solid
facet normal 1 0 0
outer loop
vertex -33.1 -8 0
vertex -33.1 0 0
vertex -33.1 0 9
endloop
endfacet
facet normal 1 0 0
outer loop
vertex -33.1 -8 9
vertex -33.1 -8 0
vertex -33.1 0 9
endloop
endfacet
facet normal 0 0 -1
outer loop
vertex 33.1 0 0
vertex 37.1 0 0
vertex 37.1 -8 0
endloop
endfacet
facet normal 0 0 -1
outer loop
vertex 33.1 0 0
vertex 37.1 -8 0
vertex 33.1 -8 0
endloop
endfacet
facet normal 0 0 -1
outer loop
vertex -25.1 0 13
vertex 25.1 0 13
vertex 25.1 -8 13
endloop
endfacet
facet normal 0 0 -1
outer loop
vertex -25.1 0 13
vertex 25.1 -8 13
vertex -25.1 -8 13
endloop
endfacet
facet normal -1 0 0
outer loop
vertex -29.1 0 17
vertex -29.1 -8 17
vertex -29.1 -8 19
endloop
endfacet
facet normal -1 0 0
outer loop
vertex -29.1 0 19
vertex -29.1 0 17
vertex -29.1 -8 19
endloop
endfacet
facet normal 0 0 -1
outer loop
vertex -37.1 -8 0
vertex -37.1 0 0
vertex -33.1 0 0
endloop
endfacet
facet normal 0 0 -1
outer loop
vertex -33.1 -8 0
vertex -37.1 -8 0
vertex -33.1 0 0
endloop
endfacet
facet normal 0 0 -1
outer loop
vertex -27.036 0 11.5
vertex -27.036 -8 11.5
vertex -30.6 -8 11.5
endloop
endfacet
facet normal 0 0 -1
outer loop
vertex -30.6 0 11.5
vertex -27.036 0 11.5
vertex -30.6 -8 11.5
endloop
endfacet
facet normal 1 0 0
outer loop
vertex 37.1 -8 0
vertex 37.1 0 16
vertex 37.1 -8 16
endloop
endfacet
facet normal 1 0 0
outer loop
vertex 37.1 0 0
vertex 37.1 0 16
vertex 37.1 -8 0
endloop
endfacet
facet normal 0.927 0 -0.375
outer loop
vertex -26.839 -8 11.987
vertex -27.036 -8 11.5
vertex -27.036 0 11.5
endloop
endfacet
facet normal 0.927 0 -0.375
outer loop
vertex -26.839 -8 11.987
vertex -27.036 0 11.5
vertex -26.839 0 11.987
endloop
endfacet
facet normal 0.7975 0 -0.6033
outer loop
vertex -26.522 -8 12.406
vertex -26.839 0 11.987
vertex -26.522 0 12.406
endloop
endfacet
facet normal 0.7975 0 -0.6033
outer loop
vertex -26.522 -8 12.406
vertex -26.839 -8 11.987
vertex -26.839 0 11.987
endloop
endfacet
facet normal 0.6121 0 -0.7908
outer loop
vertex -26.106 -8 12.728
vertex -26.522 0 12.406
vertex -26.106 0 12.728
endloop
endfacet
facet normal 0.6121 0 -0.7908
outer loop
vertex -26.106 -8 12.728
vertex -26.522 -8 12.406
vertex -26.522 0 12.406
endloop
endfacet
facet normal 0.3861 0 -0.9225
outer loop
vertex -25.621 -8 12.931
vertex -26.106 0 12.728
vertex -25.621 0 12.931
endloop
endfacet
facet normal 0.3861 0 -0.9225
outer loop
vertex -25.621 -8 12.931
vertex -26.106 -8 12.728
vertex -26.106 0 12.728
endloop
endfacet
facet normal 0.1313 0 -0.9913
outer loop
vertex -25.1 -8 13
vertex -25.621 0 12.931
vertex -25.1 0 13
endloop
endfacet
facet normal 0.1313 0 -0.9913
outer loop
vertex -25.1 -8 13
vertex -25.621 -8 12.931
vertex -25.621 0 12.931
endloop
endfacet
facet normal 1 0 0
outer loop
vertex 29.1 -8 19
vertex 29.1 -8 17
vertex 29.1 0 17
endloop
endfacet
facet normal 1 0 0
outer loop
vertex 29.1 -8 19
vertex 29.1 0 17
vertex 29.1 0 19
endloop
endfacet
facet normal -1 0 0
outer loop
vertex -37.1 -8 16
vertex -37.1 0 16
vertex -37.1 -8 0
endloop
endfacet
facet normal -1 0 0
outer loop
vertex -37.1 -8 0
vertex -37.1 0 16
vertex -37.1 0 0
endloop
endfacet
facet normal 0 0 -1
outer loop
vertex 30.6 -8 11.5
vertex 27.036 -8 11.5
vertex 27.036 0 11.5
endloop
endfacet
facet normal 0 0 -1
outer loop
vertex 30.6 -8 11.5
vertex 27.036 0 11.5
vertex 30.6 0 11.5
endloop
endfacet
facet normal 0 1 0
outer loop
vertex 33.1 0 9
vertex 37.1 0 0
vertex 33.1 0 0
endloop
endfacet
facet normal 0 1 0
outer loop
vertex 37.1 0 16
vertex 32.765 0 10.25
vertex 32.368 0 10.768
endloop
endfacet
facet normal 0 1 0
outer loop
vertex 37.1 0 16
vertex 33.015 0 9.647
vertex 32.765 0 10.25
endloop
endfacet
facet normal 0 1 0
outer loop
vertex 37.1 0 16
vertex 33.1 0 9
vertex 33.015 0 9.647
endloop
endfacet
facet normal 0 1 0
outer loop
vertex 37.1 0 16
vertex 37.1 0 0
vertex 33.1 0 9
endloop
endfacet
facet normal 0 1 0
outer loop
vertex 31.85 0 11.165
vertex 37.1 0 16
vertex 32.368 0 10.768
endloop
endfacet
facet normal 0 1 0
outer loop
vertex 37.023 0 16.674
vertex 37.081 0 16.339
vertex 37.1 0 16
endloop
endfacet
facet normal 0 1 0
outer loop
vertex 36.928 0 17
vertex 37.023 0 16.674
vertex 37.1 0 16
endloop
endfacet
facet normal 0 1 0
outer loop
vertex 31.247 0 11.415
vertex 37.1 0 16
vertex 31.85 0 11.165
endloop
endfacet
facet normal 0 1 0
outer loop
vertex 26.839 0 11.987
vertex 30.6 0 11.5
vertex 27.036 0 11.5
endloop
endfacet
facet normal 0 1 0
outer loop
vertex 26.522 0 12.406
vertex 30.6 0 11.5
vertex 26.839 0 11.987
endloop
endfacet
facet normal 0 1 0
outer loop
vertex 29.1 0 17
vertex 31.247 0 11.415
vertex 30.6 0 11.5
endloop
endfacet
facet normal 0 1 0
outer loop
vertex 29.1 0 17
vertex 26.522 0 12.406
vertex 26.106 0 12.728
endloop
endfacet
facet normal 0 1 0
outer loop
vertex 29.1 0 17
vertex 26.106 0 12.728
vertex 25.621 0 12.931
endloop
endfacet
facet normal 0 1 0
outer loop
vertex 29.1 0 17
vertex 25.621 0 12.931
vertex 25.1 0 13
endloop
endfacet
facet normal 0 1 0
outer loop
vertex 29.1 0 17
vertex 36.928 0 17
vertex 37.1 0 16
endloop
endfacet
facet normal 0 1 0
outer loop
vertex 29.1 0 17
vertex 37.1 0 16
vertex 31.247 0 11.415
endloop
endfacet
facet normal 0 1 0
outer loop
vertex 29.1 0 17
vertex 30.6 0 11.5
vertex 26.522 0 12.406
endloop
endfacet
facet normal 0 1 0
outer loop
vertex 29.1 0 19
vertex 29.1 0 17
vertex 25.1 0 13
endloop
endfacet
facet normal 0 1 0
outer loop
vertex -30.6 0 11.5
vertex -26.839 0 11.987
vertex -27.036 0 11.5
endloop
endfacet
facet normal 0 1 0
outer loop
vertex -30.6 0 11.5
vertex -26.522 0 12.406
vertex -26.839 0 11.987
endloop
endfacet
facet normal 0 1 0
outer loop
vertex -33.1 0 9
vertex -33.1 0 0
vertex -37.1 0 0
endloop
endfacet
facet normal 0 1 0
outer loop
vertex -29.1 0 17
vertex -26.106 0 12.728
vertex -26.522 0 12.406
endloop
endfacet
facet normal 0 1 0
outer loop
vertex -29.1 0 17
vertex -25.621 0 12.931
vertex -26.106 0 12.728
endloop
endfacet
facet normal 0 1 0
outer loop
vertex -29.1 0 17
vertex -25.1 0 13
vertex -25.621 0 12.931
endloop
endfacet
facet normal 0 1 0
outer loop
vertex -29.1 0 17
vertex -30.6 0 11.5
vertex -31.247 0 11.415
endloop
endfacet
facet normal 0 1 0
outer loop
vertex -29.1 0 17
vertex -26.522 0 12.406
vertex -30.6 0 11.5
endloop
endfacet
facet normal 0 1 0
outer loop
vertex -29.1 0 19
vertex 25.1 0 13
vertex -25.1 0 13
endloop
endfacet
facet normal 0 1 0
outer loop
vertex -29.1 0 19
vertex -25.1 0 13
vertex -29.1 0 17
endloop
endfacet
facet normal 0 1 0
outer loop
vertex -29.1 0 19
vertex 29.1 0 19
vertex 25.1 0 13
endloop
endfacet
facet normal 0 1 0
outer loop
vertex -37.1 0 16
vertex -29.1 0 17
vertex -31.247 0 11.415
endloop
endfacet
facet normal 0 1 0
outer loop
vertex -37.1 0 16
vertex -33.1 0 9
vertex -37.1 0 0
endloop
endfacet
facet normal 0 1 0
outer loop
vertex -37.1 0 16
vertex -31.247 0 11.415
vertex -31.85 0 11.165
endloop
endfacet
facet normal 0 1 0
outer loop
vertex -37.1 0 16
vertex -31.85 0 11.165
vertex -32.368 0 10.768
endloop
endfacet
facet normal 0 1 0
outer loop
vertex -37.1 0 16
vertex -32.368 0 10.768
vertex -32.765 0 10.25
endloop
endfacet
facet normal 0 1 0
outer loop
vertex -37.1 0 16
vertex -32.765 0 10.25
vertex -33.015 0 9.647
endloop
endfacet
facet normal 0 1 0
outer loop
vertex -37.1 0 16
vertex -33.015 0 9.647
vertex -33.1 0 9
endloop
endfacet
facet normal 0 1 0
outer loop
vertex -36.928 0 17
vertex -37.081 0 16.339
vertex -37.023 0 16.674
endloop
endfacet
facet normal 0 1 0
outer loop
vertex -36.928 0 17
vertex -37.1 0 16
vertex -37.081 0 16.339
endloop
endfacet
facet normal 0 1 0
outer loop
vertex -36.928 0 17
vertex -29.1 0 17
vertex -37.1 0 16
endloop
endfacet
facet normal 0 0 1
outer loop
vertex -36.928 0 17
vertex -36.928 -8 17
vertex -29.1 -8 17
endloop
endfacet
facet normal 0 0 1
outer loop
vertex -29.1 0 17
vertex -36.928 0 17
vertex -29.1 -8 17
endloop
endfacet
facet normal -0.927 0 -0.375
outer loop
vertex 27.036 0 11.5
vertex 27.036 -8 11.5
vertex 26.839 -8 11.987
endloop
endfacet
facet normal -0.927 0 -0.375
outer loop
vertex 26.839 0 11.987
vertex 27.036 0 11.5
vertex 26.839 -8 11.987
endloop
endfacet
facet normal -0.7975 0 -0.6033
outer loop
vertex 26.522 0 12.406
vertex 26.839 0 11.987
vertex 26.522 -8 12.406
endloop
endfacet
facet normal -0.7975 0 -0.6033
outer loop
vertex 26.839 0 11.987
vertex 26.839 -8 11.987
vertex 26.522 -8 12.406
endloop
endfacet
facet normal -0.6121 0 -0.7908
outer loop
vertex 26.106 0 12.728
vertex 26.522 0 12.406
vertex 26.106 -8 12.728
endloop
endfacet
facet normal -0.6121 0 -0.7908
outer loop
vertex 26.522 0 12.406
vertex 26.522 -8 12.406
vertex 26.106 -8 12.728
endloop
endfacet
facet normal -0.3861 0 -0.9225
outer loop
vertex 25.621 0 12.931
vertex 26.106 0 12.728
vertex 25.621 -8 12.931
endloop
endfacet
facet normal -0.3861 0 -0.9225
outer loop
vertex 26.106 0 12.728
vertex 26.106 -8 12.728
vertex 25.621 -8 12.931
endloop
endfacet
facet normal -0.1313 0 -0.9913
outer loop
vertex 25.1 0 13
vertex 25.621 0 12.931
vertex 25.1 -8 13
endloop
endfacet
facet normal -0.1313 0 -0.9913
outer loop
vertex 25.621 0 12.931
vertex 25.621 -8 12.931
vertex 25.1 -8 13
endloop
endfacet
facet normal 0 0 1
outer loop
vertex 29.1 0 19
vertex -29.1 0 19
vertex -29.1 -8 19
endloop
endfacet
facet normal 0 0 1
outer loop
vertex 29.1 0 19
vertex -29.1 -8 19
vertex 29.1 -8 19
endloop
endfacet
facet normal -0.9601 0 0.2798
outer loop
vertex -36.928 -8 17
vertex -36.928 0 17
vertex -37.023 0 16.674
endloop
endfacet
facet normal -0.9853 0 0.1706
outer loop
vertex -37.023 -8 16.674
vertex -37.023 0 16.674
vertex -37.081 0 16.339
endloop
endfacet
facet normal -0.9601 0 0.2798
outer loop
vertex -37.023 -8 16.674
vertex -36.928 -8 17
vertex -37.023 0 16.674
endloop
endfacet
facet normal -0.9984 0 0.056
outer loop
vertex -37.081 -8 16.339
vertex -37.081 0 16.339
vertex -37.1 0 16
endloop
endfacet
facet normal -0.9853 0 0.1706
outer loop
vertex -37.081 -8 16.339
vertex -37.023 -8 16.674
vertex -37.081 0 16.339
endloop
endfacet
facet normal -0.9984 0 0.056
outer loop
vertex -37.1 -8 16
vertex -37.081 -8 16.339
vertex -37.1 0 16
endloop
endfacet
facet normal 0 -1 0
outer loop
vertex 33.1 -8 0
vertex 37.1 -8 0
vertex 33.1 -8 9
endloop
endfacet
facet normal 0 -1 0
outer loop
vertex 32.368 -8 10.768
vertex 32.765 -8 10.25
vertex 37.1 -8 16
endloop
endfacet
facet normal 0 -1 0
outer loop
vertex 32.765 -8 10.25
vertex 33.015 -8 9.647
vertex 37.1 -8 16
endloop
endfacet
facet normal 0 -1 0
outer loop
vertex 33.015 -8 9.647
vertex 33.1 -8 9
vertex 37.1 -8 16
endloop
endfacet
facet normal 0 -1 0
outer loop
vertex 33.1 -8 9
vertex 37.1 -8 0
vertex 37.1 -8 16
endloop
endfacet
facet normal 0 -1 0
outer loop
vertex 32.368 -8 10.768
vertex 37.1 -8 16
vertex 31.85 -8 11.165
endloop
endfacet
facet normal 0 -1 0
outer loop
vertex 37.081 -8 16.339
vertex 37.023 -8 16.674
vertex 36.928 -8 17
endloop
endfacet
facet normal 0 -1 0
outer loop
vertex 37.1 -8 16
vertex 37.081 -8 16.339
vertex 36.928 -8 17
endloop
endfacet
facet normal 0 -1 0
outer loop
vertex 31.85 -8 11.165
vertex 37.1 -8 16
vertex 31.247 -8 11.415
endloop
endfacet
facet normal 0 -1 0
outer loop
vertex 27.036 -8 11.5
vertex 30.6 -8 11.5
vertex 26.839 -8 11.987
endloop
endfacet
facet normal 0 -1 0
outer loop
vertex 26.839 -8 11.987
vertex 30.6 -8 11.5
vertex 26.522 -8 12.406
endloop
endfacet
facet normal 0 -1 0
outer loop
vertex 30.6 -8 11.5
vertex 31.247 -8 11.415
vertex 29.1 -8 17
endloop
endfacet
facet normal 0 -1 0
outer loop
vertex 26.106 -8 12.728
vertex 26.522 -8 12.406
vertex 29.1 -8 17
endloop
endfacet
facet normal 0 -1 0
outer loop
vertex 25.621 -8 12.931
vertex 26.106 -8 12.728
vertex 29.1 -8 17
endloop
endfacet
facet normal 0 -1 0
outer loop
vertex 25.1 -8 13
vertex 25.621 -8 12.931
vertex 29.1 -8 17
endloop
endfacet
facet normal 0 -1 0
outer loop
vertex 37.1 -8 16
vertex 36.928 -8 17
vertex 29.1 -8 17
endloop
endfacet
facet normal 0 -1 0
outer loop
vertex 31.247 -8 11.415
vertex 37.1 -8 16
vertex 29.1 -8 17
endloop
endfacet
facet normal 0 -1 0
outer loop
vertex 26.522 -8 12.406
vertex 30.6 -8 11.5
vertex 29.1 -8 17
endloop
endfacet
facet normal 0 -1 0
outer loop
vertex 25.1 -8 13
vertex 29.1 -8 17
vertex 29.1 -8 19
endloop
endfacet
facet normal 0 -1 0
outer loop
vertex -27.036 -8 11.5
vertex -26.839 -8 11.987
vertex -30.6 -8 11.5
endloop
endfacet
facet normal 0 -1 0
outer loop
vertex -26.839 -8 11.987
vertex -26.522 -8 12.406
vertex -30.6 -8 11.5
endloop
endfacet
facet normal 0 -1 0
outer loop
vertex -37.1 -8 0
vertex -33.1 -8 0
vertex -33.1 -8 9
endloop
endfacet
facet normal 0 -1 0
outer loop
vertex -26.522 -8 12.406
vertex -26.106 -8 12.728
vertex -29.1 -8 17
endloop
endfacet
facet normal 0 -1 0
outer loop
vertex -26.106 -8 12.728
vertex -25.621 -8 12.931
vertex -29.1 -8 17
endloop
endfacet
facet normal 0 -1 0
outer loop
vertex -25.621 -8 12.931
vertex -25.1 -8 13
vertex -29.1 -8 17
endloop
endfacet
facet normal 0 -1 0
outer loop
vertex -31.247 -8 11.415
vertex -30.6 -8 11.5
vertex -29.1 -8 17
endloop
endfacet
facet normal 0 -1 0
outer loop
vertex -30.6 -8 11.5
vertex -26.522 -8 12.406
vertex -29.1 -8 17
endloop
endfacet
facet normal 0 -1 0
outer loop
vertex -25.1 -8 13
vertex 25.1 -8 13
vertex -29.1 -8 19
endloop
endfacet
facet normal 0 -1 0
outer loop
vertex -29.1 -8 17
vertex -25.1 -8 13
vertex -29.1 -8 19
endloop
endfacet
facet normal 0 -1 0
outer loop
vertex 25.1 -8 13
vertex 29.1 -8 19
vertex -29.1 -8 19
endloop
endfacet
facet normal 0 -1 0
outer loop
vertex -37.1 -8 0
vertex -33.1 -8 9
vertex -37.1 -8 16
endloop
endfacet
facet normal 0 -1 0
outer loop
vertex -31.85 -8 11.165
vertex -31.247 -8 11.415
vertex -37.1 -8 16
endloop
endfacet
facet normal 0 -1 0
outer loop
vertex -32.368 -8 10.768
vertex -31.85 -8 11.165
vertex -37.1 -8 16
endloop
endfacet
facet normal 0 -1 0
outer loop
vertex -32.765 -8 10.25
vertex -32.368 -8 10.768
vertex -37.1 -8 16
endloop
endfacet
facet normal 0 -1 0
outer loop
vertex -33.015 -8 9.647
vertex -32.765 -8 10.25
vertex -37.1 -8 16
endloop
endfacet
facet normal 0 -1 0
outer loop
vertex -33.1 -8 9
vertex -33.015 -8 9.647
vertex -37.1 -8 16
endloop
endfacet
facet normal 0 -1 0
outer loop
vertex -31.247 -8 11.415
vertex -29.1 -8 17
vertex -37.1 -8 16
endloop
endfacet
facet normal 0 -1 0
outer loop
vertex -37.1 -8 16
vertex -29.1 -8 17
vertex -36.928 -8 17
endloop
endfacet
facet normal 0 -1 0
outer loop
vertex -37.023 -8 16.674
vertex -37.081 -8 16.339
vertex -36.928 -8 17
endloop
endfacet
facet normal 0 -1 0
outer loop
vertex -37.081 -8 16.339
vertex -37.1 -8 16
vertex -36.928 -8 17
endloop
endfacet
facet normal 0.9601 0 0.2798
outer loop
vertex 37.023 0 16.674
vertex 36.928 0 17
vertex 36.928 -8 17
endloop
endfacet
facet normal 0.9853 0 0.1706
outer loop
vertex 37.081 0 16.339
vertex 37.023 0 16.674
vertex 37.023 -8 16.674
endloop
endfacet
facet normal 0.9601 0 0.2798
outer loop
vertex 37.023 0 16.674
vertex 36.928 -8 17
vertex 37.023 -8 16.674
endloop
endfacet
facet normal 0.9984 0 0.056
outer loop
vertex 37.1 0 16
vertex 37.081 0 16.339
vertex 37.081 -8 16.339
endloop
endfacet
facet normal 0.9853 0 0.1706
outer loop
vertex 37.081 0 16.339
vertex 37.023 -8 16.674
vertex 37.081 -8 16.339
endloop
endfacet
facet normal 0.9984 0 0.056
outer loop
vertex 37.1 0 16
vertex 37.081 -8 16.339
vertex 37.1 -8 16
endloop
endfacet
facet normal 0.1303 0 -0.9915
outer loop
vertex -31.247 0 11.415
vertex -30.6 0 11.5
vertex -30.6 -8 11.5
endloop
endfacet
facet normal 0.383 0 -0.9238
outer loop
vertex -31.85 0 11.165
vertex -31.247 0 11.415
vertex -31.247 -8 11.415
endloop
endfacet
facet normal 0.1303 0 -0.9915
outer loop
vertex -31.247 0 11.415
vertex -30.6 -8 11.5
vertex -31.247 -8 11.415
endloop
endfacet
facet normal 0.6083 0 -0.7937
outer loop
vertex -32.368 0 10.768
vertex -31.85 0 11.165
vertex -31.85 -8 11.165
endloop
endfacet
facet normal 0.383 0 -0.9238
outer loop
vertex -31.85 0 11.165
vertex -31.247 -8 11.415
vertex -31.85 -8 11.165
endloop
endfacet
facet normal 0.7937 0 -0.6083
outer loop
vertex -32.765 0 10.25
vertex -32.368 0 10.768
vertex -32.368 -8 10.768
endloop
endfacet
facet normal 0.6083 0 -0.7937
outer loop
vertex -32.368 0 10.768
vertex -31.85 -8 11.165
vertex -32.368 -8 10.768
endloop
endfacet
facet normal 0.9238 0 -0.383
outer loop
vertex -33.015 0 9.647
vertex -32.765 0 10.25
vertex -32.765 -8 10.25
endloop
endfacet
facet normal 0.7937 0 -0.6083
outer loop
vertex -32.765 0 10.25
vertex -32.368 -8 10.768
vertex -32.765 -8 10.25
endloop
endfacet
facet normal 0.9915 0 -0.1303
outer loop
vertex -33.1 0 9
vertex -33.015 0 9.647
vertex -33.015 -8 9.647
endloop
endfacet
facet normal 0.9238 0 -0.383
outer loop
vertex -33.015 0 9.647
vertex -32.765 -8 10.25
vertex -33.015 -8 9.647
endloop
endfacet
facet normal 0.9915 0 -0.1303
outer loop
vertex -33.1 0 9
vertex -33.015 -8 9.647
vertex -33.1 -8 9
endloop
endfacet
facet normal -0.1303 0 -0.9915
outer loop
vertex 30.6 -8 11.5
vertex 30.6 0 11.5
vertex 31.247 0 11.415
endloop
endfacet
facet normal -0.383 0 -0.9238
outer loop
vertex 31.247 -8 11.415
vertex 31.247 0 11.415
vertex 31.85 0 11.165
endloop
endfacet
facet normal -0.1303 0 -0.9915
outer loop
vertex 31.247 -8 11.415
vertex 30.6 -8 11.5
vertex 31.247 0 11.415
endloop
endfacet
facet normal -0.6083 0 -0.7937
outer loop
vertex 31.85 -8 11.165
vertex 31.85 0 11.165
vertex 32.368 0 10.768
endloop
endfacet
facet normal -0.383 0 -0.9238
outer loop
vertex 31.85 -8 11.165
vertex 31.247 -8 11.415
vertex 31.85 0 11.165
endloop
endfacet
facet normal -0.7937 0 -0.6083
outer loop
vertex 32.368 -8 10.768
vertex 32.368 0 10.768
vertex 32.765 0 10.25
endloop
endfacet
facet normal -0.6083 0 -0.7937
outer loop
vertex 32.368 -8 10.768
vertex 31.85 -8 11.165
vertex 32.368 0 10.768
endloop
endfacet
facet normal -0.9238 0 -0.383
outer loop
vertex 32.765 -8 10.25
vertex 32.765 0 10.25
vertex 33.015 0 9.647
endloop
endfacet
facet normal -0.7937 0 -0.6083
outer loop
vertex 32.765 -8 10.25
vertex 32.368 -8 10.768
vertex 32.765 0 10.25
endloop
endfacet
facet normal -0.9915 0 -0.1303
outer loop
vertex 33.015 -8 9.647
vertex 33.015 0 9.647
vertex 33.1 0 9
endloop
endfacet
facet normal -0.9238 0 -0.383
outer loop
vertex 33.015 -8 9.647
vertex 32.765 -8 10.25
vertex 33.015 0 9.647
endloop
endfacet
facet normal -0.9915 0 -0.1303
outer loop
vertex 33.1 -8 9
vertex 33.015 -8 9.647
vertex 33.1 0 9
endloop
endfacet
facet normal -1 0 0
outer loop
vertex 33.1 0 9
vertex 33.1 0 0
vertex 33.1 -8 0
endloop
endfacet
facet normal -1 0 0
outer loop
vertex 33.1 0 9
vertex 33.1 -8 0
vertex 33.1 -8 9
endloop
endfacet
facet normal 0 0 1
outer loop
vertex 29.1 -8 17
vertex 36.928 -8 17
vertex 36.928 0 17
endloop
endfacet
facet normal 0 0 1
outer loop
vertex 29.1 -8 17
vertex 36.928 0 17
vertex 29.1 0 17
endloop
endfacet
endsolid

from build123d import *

# Parameters (mm, degrees)
F1_DEPTH = 8
F2_R     = 2
F3_R     = 3
F4_R     = 2.5
F5_DEPTH = 8.001
F7_DEPTH = 8.001


with BuildPart() as f1:
    # F0 (on Front) → F1 (new body)
    with BuildSketch(Plane.XZ):
        Polygon((-37.1, 0), (-33.1, 0), (-33.1, 9), (-27.1, 9), (-27.1, 13), (0, 13), (0, 19), (-37.1, 19), align=None)
    extrude(amount=F1_DEPTH)

    # F2
    f2_edges = [f1.edges().sort_by_distance(p)[0] for p in [
        (-27.1, -4, 13),
    ]]
    fillet(f2_edges, radius=F2_R)

    # F3
    f3_edges = [f1.edges().sort_by_distance(p)[0] for p in [
        (-37.1, -4, 19),
    ]]
    fillet(f3_edges, radius=F3_R)

    # F4 (on face) → F5 (cut, through all)
    with BuildSketch(Plane.XZ.offset(8)):
        with Locations((-30.6, 9)):
            Circle(F4_R)
    extrude(amount=-F5_DEPTH, mode=Mode.SUBTRACT)

    # F6 (on face) → F7 (cut, through all)
    with BuildSketch(Plane.XZ.offset(8)):
        with BuildLine():
            Line((-29.1, 19), (-34.1, 19))
            ThreePointArc((-34.1, 19), (-35.8320508076, 18.4494897428), (-36.9284271247, 17))
            Line((-36.9284271247, 17), (-29.1, 17))
            Line((-29.1, 17), (-29.1, 19))
        make_face()
        with BuildLine():
            ThreePointArc((-27.1, 11), (-27.0840593925, 11.252008585), (-27.0364916731, 11.5))
            Line((-27.0364916731, 11.5), (-30.6, 11.5))
            ThreePointArc((-30.6, 11.5), (-28.832233047, 10.767766953), (-28.1, 9))
            Line((-28.1, 9), (-27.1, 9))
            Line((-27.1, 9), (-27.1, 11))
        make_face()
    extrude(amount=-F7_DEPTH, mode=Mode.SUBTRACT)

    # F8: F1 across plane


with BuildPart() as f1_1:
    add(f1.part)
    add(f1.part.mirror(Plane.YZ))


solid = f1_1.part
